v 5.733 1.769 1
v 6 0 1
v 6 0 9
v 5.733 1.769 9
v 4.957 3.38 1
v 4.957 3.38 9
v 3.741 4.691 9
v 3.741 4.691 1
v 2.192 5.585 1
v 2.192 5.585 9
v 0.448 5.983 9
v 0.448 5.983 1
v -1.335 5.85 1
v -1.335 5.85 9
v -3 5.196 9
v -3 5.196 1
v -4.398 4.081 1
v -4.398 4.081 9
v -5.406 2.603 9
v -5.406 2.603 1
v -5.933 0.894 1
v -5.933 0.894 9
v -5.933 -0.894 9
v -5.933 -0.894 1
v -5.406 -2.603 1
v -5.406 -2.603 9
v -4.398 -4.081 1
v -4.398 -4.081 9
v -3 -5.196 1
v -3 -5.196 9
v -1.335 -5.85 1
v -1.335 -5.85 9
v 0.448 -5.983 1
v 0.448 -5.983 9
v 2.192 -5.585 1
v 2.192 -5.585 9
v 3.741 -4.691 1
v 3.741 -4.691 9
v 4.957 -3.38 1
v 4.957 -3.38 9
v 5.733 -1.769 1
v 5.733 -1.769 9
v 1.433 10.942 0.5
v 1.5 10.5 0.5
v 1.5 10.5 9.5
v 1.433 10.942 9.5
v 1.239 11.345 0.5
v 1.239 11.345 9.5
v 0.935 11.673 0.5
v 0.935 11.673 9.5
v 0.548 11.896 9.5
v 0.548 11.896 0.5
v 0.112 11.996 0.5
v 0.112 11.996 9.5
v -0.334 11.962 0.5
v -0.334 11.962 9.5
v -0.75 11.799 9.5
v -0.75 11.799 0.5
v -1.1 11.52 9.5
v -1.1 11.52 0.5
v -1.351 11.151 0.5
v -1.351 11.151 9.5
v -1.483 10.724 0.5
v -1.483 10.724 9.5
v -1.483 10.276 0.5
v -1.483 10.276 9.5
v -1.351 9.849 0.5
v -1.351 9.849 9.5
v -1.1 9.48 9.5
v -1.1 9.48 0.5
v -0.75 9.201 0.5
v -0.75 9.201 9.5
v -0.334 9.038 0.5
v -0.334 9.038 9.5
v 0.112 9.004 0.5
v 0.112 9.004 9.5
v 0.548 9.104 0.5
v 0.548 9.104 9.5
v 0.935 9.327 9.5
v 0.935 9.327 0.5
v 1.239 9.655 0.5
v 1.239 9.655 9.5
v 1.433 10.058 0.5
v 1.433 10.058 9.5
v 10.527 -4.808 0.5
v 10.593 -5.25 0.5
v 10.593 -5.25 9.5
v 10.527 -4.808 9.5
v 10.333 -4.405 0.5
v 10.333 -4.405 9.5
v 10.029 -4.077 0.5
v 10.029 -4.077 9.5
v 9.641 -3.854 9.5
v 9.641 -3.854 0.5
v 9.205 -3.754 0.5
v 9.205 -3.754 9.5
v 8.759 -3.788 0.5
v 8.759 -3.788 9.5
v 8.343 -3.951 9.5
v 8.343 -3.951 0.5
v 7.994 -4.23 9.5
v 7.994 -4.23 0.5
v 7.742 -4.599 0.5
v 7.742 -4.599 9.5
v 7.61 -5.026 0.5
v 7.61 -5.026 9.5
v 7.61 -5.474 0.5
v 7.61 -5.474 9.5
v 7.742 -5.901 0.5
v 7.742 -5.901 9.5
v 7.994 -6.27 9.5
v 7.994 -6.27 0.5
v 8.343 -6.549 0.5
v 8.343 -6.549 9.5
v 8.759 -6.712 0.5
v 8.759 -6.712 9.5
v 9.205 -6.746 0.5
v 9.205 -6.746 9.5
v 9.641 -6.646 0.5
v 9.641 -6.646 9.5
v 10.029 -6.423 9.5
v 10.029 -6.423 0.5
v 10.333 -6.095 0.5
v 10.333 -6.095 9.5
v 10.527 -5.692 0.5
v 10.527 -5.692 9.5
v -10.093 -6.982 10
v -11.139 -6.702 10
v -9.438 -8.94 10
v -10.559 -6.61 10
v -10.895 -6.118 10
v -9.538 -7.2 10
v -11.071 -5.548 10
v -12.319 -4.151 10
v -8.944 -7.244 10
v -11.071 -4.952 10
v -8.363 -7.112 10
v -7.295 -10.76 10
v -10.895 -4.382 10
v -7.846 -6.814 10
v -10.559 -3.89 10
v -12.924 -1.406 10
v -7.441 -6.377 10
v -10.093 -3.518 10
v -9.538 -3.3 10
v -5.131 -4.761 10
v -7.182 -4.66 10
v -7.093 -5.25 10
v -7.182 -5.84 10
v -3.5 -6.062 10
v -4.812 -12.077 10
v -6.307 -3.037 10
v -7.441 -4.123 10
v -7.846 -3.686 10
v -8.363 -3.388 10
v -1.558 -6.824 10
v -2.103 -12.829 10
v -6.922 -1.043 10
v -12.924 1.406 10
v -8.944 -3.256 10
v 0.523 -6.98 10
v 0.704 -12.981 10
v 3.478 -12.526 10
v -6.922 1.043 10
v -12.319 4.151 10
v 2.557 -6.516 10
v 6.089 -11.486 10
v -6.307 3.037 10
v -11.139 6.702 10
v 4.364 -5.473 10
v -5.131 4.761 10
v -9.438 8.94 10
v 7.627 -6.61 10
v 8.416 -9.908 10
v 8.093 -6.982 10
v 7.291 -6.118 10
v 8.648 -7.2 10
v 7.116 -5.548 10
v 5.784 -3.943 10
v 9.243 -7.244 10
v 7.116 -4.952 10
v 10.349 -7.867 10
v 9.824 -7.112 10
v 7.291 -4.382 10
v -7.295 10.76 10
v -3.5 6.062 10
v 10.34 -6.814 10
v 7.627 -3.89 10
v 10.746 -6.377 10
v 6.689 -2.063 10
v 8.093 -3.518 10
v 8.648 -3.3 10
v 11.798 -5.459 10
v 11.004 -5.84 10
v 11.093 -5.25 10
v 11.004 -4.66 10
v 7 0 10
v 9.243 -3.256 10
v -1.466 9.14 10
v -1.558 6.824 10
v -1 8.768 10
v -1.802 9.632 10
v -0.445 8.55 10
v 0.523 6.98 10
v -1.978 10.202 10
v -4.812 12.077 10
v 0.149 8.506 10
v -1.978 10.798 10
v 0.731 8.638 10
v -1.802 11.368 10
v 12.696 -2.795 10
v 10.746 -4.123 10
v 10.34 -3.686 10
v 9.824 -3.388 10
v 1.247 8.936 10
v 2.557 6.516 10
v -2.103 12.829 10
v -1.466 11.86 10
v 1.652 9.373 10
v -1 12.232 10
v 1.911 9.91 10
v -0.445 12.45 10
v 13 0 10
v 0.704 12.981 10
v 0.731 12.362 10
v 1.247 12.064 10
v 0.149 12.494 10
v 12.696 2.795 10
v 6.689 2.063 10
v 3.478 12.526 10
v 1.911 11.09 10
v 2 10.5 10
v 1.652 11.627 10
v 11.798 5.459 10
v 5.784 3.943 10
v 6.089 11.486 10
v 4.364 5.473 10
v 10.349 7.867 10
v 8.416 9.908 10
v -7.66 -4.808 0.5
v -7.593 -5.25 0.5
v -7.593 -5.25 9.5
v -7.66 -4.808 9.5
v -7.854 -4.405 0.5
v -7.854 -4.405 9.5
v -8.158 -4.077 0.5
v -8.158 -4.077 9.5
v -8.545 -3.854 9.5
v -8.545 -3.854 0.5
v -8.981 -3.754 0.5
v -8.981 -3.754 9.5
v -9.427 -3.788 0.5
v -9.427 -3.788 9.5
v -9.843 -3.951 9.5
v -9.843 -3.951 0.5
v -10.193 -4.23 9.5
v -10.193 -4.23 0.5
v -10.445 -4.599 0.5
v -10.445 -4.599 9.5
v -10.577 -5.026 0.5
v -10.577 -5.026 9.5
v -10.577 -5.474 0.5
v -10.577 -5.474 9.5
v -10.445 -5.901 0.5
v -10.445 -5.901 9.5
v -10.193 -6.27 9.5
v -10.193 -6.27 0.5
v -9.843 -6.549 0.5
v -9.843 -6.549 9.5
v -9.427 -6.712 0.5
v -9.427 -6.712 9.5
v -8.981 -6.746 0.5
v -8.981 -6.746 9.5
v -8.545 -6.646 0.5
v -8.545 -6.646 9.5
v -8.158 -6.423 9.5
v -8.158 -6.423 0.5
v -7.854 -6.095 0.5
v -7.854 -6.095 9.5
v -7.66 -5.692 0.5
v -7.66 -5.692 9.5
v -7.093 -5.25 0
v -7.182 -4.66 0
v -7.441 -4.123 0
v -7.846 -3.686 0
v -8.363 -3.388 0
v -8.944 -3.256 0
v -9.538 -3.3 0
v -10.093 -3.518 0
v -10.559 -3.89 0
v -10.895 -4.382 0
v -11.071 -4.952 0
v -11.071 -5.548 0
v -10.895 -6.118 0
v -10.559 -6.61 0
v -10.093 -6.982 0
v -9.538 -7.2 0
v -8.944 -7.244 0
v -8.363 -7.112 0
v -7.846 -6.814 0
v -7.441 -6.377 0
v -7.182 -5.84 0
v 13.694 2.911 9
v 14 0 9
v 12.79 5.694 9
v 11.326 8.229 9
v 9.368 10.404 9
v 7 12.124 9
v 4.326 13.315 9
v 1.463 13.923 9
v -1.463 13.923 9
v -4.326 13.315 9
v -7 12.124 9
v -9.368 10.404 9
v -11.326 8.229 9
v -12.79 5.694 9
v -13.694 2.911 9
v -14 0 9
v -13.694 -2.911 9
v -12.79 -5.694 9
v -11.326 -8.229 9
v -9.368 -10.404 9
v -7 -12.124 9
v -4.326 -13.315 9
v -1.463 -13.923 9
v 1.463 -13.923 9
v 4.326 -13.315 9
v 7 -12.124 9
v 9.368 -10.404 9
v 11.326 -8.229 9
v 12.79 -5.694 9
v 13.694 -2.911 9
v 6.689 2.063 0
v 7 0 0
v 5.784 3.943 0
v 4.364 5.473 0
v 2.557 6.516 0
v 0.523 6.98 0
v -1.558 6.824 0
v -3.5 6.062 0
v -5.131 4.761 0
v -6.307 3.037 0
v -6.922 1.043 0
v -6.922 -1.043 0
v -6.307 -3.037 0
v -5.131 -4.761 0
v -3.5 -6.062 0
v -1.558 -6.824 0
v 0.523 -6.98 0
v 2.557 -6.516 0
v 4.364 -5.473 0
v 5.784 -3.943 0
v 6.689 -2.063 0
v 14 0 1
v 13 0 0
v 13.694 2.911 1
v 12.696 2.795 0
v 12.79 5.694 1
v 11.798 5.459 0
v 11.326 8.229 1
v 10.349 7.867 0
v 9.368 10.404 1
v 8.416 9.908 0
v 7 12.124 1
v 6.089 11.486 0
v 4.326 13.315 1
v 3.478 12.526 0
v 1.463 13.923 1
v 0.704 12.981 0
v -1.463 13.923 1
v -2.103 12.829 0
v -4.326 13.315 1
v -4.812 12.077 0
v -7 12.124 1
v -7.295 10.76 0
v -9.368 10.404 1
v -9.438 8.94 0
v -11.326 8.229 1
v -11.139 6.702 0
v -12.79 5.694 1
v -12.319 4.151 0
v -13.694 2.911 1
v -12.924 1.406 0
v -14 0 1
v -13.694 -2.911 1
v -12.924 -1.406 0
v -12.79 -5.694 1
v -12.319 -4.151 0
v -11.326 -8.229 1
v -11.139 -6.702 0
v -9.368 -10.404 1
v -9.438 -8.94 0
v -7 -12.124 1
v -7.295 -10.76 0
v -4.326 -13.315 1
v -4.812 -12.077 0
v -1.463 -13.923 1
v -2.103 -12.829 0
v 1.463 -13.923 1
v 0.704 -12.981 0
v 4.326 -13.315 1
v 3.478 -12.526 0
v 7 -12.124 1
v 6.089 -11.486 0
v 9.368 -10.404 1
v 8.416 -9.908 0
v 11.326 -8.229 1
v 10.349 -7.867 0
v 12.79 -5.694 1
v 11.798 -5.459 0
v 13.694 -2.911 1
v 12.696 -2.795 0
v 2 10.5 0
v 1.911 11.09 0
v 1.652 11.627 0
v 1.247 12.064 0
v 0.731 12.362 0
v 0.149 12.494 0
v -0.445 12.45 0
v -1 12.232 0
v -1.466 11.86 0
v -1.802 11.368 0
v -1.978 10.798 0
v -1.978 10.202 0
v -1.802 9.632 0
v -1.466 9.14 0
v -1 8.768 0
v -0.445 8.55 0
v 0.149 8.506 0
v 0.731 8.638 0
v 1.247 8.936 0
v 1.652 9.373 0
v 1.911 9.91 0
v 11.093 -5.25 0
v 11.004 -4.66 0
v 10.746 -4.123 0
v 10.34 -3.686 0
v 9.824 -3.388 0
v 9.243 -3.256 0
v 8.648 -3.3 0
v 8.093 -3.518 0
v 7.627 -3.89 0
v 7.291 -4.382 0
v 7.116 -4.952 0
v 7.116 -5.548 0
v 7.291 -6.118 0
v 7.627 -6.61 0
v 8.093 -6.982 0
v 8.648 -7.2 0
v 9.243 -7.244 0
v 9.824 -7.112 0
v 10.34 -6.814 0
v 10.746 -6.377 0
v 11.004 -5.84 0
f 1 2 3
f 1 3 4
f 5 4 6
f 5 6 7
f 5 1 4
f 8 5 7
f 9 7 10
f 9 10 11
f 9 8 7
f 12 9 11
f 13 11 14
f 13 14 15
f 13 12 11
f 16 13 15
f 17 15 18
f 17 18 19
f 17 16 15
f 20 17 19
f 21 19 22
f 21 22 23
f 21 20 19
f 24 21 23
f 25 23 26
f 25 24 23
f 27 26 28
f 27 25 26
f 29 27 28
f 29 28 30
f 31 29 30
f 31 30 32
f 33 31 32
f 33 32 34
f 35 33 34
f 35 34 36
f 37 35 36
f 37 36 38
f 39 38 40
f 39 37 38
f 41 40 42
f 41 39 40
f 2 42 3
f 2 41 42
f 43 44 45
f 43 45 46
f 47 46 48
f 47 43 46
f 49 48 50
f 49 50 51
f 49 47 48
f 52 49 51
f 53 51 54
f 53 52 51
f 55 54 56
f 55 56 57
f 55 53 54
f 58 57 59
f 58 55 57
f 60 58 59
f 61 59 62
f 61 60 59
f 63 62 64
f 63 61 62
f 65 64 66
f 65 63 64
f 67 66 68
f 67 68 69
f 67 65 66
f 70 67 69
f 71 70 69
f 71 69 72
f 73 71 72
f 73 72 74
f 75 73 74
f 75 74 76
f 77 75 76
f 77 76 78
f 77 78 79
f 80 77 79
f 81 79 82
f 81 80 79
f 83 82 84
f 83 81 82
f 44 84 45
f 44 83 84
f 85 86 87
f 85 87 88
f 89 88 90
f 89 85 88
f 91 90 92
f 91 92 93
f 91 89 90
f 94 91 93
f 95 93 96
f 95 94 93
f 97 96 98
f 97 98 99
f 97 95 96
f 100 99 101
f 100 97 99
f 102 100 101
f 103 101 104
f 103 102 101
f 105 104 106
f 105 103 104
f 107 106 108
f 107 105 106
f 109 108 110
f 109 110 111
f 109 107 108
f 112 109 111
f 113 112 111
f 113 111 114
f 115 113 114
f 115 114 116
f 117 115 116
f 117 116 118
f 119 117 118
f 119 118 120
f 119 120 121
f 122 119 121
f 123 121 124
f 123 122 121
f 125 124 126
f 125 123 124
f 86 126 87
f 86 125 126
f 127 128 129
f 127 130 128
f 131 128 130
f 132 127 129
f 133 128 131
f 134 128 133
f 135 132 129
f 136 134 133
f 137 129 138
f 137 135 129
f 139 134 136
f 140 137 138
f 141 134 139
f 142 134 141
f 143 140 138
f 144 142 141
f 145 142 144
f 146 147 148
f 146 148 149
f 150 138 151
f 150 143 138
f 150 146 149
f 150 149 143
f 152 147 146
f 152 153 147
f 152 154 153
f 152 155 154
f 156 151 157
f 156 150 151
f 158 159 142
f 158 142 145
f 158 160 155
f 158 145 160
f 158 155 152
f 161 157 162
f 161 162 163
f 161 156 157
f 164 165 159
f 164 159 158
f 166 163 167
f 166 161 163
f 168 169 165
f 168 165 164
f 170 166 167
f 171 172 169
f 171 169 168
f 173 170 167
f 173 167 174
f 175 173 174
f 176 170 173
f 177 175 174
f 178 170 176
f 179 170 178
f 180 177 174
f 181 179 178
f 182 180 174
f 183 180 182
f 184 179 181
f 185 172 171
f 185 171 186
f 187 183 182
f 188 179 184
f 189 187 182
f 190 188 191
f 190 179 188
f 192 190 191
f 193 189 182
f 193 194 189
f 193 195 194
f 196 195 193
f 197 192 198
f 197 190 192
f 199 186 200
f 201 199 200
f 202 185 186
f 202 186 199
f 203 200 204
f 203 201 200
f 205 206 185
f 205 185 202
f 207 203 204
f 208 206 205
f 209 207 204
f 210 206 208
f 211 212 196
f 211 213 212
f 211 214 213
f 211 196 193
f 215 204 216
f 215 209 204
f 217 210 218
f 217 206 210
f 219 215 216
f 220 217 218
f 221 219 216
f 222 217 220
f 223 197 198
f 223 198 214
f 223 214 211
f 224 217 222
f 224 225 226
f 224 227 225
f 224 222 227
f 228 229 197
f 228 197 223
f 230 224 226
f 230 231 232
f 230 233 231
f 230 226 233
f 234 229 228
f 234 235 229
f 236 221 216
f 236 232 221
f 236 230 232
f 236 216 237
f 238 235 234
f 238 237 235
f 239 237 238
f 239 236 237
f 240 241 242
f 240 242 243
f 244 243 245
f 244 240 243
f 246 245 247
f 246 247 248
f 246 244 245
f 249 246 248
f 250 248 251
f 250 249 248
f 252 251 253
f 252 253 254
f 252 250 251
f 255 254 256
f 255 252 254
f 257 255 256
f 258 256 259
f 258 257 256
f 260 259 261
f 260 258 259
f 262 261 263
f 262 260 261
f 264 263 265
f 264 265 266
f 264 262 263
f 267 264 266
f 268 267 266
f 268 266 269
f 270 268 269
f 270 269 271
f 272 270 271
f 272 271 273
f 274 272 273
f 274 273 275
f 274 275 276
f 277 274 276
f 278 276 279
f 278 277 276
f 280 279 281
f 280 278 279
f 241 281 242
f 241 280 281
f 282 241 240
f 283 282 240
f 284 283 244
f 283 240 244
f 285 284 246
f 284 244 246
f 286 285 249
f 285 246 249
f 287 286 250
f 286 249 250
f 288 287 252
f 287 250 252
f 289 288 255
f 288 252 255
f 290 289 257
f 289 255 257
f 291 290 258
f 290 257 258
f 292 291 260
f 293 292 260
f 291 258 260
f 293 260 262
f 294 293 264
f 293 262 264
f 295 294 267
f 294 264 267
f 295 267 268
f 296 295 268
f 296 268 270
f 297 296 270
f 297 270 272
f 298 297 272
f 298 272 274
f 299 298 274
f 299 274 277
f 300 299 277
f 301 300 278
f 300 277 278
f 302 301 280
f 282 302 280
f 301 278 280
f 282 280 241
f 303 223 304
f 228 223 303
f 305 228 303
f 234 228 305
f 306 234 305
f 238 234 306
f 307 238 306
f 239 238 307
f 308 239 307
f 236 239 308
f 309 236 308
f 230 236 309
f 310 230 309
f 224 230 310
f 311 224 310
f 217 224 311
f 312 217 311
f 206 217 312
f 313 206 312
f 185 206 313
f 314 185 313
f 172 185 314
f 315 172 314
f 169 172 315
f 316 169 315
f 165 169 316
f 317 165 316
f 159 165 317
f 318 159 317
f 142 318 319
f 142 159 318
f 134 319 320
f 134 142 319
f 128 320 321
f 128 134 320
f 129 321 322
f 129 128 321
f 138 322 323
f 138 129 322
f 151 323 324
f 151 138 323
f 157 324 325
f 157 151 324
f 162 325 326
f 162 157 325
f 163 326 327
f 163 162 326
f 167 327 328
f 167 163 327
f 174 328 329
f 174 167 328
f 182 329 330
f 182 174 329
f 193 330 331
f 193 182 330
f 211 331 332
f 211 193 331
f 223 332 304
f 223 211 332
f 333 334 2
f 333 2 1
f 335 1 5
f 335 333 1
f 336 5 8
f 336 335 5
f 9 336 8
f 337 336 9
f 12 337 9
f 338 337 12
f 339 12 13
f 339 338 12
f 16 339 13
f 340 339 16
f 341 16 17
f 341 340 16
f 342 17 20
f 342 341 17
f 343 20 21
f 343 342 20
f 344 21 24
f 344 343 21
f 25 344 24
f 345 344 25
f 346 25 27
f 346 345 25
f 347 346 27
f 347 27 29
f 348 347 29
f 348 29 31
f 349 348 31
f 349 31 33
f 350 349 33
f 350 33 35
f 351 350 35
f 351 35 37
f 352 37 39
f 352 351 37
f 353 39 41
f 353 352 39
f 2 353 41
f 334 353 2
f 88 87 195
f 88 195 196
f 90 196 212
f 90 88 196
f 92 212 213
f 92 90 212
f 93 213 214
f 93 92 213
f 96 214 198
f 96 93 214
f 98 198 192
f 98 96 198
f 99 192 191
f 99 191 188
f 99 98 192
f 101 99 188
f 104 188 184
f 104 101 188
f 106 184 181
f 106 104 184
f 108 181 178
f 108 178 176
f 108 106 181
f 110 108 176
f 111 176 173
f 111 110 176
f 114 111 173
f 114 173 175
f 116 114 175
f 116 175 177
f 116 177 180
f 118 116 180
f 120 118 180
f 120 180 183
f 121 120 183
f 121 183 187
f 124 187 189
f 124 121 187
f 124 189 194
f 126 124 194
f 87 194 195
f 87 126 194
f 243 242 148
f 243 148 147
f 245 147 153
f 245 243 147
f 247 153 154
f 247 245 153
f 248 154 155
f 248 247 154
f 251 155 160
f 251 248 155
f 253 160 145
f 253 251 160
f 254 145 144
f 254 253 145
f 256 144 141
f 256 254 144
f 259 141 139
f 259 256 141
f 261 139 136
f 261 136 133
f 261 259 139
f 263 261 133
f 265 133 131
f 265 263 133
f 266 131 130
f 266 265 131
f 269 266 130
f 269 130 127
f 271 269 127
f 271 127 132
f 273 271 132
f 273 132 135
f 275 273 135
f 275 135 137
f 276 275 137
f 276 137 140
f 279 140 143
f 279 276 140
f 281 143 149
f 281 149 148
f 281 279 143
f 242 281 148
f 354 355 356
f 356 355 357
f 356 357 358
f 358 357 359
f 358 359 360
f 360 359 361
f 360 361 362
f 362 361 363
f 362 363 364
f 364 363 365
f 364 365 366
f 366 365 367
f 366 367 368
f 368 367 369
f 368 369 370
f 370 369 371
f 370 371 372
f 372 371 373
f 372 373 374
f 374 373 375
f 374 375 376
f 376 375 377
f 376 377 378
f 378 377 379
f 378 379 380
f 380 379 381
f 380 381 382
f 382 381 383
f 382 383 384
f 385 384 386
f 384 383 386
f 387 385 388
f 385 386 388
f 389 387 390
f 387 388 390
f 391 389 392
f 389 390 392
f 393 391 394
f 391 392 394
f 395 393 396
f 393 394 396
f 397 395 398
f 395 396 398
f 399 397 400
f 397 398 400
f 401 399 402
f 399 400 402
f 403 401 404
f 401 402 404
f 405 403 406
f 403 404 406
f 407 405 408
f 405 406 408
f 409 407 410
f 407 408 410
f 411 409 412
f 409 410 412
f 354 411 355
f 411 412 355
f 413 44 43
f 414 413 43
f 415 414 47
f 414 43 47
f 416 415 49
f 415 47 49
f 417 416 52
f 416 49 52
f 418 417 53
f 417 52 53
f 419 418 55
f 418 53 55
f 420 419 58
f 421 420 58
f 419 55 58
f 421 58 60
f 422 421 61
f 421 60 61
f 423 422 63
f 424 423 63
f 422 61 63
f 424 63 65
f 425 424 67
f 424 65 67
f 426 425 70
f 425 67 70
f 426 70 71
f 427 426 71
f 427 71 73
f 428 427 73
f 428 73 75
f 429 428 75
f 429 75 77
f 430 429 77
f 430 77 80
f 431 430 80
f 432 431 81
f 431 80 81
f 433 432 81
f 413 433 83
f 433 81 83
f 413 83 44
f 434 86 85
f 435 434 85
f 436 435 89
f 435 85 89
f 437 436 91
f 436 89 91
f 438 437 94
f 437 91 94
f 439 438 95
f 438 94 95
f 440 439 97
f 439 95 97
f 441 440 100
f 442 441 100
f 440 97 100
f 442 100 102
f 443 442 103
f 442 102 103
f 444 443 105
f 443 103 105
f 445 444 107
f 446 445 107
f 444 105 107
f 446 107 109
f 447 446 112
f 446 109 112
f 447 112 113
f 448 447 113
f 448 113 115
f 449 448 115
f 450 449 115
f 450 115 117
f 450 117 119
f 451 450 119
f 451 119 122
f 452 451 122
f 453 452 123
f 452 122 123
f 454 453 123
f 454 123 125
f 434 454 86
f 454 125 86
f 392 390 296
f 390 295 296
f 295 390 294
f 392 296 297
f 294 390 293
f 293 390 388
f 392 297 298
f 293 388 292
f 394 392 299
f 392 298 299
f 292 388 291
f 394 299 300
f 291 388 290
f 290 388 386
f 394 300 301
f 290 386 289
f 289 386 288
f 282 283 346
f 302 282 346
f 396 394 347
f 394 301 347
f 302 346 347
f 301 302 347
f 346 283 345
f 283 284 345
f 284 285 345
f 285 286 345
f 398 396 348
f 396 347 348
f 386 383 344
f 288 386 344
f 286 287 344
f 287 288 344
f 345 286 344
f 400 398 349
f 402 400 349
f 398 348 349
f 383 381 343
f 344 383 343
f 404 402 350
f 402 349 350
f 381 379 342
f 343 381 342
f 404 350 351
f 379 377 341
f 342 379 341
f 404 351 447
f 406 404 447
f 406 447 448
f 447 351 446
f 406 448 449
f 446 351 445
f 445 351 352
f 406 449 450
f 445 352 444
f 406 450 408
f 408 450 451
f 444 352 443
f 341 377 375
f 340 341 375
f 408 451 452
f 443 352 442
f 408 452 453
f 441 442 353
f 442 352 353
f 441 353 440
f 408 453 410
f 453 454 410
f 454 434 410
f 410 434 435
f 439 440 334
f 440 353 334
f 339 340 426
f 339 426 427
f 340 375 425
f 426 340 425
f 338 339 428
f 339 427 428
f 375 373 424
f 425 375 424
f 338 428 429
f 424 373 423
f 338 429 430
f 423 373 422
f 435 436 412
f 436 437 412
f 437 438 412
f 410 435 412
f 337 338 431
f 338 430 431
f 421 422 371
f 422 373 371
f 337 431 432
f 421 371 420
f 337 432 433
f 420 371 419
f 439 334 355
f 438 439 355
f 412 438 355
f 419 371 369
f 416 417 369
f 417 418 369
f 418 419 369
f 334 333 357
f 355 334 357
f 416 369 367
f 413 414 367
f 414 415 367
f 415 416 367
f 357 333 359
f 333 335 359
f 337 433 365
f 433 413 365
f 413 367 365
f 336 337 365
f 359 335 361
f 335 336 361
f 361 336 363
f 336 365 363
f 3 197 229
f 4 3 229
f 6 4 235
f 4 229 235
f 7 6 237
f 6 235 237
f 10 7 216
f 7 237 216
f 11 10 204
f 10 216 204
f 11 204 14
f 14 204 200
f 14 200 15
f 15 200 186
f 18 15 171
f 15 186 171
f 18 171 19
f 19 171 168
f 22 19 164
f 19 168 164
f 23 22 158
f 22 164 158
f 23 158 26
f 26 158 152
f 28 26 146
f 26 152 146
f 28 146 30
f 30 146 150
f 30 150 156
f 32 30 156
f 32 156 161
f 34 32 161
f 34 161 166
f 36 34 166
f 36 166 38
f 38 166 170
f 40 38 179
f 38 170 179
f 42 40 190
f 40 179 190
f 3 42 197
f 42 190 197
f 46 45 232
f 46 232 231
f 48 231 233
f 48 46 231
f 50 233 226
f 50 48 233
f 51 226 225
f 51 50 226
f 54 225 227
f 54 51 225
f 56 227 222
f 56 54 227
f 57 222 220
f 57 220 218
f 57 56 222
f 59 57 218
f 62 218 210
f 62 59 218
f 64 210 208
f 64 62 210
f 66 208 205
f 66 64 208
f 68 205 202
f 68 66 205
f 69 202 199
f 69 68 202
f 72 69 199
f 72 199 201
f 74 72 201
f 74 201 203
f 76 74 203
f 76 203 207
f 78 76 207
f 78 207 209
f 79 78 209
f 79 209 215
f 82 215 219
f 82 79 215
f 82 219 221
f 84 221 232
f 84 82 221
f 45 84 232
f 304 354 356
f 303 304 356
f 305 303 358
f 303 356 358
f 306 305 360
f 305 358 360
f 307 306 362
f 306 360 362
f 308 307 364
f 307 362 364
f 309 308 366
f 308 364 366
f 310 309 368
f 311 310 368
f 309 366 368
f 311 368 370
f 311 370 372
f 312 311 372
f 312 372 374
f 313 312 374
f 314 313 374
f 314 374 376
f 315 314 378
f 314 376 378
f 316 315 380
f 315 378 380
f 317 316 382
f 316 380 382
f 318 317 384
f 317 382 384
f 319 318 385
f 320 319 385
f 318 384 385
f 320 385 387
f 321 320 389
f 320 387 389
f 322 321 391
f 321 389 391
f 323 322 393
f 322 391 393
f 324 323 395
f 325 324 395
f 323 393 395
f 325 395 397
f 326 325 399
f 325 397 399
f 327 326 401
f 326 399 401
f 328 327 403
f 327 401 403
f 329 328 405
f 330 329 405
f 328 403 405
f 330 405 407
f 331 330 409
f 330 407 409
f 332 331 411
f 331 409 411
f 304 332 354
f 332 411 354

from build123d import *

# Parameters (mm, degrees)
SKETCH1_R           = 14
SKETCH1_R_2         = 6
SKETCH1_R_3         = 1.5
BOSS_EXTRUDE1_DEPTH = 10
CHAMFER1_SIZE       = 1
CHAMFER2_SIZE       = 0.5


with BuildPart() as part:
    # Sketch1 → Boss-Extrude1 (new body)
    with BuildSketch(Plane.XY):
        Circle(SKETCH1_R)
        Circle(SKETCH1_R_2, mode=Mode.SUBTRACT)
        with Locations((0, 10.5)):
            Circle(SKETCH1_R_3, mode=Mode.SUBTRACT)
        with Locations((9.09326674, -5.25)):
            Circle(SKETCH1_R_3, mode=Mode.SUBTRACT)
        with Locations((-9.09326674, -5.25)):
            Circle(SKETCH1_R_3, mode=Mode.SUBTRACT)
    extrude(amount=BOSS_EXTRUDE1_DEPTH)

    # Chamfer1
    chamfer1_edges = [part.edges().sort_by_distance(p)[0] for p in [
        (-14, 0, 0),
        (-14, 0, 10),
        (-6, 0, 0),
        (-6, 0, 10),
    ]]
    chamfer(chamfer1_edges, length=CHAMFER1_SIZE)

    # Chamfer2
    chamfer2_edges = [part.edges().sort_by_distance(p)[0] for p in [
        (7.59326674, -5.25, 0),
        (7.59326674, -5.25, 10),
        (-10.59326674, -5.25, 0),
        (-10.59326674, -5.25, 10),
        (-1.5, 10.5, 0),
        (-1.5, 10.5, 10),
    ]]
    chamfer(chamfer2_edges, length=CHAMFER2_SIZE)


solid = part.part
